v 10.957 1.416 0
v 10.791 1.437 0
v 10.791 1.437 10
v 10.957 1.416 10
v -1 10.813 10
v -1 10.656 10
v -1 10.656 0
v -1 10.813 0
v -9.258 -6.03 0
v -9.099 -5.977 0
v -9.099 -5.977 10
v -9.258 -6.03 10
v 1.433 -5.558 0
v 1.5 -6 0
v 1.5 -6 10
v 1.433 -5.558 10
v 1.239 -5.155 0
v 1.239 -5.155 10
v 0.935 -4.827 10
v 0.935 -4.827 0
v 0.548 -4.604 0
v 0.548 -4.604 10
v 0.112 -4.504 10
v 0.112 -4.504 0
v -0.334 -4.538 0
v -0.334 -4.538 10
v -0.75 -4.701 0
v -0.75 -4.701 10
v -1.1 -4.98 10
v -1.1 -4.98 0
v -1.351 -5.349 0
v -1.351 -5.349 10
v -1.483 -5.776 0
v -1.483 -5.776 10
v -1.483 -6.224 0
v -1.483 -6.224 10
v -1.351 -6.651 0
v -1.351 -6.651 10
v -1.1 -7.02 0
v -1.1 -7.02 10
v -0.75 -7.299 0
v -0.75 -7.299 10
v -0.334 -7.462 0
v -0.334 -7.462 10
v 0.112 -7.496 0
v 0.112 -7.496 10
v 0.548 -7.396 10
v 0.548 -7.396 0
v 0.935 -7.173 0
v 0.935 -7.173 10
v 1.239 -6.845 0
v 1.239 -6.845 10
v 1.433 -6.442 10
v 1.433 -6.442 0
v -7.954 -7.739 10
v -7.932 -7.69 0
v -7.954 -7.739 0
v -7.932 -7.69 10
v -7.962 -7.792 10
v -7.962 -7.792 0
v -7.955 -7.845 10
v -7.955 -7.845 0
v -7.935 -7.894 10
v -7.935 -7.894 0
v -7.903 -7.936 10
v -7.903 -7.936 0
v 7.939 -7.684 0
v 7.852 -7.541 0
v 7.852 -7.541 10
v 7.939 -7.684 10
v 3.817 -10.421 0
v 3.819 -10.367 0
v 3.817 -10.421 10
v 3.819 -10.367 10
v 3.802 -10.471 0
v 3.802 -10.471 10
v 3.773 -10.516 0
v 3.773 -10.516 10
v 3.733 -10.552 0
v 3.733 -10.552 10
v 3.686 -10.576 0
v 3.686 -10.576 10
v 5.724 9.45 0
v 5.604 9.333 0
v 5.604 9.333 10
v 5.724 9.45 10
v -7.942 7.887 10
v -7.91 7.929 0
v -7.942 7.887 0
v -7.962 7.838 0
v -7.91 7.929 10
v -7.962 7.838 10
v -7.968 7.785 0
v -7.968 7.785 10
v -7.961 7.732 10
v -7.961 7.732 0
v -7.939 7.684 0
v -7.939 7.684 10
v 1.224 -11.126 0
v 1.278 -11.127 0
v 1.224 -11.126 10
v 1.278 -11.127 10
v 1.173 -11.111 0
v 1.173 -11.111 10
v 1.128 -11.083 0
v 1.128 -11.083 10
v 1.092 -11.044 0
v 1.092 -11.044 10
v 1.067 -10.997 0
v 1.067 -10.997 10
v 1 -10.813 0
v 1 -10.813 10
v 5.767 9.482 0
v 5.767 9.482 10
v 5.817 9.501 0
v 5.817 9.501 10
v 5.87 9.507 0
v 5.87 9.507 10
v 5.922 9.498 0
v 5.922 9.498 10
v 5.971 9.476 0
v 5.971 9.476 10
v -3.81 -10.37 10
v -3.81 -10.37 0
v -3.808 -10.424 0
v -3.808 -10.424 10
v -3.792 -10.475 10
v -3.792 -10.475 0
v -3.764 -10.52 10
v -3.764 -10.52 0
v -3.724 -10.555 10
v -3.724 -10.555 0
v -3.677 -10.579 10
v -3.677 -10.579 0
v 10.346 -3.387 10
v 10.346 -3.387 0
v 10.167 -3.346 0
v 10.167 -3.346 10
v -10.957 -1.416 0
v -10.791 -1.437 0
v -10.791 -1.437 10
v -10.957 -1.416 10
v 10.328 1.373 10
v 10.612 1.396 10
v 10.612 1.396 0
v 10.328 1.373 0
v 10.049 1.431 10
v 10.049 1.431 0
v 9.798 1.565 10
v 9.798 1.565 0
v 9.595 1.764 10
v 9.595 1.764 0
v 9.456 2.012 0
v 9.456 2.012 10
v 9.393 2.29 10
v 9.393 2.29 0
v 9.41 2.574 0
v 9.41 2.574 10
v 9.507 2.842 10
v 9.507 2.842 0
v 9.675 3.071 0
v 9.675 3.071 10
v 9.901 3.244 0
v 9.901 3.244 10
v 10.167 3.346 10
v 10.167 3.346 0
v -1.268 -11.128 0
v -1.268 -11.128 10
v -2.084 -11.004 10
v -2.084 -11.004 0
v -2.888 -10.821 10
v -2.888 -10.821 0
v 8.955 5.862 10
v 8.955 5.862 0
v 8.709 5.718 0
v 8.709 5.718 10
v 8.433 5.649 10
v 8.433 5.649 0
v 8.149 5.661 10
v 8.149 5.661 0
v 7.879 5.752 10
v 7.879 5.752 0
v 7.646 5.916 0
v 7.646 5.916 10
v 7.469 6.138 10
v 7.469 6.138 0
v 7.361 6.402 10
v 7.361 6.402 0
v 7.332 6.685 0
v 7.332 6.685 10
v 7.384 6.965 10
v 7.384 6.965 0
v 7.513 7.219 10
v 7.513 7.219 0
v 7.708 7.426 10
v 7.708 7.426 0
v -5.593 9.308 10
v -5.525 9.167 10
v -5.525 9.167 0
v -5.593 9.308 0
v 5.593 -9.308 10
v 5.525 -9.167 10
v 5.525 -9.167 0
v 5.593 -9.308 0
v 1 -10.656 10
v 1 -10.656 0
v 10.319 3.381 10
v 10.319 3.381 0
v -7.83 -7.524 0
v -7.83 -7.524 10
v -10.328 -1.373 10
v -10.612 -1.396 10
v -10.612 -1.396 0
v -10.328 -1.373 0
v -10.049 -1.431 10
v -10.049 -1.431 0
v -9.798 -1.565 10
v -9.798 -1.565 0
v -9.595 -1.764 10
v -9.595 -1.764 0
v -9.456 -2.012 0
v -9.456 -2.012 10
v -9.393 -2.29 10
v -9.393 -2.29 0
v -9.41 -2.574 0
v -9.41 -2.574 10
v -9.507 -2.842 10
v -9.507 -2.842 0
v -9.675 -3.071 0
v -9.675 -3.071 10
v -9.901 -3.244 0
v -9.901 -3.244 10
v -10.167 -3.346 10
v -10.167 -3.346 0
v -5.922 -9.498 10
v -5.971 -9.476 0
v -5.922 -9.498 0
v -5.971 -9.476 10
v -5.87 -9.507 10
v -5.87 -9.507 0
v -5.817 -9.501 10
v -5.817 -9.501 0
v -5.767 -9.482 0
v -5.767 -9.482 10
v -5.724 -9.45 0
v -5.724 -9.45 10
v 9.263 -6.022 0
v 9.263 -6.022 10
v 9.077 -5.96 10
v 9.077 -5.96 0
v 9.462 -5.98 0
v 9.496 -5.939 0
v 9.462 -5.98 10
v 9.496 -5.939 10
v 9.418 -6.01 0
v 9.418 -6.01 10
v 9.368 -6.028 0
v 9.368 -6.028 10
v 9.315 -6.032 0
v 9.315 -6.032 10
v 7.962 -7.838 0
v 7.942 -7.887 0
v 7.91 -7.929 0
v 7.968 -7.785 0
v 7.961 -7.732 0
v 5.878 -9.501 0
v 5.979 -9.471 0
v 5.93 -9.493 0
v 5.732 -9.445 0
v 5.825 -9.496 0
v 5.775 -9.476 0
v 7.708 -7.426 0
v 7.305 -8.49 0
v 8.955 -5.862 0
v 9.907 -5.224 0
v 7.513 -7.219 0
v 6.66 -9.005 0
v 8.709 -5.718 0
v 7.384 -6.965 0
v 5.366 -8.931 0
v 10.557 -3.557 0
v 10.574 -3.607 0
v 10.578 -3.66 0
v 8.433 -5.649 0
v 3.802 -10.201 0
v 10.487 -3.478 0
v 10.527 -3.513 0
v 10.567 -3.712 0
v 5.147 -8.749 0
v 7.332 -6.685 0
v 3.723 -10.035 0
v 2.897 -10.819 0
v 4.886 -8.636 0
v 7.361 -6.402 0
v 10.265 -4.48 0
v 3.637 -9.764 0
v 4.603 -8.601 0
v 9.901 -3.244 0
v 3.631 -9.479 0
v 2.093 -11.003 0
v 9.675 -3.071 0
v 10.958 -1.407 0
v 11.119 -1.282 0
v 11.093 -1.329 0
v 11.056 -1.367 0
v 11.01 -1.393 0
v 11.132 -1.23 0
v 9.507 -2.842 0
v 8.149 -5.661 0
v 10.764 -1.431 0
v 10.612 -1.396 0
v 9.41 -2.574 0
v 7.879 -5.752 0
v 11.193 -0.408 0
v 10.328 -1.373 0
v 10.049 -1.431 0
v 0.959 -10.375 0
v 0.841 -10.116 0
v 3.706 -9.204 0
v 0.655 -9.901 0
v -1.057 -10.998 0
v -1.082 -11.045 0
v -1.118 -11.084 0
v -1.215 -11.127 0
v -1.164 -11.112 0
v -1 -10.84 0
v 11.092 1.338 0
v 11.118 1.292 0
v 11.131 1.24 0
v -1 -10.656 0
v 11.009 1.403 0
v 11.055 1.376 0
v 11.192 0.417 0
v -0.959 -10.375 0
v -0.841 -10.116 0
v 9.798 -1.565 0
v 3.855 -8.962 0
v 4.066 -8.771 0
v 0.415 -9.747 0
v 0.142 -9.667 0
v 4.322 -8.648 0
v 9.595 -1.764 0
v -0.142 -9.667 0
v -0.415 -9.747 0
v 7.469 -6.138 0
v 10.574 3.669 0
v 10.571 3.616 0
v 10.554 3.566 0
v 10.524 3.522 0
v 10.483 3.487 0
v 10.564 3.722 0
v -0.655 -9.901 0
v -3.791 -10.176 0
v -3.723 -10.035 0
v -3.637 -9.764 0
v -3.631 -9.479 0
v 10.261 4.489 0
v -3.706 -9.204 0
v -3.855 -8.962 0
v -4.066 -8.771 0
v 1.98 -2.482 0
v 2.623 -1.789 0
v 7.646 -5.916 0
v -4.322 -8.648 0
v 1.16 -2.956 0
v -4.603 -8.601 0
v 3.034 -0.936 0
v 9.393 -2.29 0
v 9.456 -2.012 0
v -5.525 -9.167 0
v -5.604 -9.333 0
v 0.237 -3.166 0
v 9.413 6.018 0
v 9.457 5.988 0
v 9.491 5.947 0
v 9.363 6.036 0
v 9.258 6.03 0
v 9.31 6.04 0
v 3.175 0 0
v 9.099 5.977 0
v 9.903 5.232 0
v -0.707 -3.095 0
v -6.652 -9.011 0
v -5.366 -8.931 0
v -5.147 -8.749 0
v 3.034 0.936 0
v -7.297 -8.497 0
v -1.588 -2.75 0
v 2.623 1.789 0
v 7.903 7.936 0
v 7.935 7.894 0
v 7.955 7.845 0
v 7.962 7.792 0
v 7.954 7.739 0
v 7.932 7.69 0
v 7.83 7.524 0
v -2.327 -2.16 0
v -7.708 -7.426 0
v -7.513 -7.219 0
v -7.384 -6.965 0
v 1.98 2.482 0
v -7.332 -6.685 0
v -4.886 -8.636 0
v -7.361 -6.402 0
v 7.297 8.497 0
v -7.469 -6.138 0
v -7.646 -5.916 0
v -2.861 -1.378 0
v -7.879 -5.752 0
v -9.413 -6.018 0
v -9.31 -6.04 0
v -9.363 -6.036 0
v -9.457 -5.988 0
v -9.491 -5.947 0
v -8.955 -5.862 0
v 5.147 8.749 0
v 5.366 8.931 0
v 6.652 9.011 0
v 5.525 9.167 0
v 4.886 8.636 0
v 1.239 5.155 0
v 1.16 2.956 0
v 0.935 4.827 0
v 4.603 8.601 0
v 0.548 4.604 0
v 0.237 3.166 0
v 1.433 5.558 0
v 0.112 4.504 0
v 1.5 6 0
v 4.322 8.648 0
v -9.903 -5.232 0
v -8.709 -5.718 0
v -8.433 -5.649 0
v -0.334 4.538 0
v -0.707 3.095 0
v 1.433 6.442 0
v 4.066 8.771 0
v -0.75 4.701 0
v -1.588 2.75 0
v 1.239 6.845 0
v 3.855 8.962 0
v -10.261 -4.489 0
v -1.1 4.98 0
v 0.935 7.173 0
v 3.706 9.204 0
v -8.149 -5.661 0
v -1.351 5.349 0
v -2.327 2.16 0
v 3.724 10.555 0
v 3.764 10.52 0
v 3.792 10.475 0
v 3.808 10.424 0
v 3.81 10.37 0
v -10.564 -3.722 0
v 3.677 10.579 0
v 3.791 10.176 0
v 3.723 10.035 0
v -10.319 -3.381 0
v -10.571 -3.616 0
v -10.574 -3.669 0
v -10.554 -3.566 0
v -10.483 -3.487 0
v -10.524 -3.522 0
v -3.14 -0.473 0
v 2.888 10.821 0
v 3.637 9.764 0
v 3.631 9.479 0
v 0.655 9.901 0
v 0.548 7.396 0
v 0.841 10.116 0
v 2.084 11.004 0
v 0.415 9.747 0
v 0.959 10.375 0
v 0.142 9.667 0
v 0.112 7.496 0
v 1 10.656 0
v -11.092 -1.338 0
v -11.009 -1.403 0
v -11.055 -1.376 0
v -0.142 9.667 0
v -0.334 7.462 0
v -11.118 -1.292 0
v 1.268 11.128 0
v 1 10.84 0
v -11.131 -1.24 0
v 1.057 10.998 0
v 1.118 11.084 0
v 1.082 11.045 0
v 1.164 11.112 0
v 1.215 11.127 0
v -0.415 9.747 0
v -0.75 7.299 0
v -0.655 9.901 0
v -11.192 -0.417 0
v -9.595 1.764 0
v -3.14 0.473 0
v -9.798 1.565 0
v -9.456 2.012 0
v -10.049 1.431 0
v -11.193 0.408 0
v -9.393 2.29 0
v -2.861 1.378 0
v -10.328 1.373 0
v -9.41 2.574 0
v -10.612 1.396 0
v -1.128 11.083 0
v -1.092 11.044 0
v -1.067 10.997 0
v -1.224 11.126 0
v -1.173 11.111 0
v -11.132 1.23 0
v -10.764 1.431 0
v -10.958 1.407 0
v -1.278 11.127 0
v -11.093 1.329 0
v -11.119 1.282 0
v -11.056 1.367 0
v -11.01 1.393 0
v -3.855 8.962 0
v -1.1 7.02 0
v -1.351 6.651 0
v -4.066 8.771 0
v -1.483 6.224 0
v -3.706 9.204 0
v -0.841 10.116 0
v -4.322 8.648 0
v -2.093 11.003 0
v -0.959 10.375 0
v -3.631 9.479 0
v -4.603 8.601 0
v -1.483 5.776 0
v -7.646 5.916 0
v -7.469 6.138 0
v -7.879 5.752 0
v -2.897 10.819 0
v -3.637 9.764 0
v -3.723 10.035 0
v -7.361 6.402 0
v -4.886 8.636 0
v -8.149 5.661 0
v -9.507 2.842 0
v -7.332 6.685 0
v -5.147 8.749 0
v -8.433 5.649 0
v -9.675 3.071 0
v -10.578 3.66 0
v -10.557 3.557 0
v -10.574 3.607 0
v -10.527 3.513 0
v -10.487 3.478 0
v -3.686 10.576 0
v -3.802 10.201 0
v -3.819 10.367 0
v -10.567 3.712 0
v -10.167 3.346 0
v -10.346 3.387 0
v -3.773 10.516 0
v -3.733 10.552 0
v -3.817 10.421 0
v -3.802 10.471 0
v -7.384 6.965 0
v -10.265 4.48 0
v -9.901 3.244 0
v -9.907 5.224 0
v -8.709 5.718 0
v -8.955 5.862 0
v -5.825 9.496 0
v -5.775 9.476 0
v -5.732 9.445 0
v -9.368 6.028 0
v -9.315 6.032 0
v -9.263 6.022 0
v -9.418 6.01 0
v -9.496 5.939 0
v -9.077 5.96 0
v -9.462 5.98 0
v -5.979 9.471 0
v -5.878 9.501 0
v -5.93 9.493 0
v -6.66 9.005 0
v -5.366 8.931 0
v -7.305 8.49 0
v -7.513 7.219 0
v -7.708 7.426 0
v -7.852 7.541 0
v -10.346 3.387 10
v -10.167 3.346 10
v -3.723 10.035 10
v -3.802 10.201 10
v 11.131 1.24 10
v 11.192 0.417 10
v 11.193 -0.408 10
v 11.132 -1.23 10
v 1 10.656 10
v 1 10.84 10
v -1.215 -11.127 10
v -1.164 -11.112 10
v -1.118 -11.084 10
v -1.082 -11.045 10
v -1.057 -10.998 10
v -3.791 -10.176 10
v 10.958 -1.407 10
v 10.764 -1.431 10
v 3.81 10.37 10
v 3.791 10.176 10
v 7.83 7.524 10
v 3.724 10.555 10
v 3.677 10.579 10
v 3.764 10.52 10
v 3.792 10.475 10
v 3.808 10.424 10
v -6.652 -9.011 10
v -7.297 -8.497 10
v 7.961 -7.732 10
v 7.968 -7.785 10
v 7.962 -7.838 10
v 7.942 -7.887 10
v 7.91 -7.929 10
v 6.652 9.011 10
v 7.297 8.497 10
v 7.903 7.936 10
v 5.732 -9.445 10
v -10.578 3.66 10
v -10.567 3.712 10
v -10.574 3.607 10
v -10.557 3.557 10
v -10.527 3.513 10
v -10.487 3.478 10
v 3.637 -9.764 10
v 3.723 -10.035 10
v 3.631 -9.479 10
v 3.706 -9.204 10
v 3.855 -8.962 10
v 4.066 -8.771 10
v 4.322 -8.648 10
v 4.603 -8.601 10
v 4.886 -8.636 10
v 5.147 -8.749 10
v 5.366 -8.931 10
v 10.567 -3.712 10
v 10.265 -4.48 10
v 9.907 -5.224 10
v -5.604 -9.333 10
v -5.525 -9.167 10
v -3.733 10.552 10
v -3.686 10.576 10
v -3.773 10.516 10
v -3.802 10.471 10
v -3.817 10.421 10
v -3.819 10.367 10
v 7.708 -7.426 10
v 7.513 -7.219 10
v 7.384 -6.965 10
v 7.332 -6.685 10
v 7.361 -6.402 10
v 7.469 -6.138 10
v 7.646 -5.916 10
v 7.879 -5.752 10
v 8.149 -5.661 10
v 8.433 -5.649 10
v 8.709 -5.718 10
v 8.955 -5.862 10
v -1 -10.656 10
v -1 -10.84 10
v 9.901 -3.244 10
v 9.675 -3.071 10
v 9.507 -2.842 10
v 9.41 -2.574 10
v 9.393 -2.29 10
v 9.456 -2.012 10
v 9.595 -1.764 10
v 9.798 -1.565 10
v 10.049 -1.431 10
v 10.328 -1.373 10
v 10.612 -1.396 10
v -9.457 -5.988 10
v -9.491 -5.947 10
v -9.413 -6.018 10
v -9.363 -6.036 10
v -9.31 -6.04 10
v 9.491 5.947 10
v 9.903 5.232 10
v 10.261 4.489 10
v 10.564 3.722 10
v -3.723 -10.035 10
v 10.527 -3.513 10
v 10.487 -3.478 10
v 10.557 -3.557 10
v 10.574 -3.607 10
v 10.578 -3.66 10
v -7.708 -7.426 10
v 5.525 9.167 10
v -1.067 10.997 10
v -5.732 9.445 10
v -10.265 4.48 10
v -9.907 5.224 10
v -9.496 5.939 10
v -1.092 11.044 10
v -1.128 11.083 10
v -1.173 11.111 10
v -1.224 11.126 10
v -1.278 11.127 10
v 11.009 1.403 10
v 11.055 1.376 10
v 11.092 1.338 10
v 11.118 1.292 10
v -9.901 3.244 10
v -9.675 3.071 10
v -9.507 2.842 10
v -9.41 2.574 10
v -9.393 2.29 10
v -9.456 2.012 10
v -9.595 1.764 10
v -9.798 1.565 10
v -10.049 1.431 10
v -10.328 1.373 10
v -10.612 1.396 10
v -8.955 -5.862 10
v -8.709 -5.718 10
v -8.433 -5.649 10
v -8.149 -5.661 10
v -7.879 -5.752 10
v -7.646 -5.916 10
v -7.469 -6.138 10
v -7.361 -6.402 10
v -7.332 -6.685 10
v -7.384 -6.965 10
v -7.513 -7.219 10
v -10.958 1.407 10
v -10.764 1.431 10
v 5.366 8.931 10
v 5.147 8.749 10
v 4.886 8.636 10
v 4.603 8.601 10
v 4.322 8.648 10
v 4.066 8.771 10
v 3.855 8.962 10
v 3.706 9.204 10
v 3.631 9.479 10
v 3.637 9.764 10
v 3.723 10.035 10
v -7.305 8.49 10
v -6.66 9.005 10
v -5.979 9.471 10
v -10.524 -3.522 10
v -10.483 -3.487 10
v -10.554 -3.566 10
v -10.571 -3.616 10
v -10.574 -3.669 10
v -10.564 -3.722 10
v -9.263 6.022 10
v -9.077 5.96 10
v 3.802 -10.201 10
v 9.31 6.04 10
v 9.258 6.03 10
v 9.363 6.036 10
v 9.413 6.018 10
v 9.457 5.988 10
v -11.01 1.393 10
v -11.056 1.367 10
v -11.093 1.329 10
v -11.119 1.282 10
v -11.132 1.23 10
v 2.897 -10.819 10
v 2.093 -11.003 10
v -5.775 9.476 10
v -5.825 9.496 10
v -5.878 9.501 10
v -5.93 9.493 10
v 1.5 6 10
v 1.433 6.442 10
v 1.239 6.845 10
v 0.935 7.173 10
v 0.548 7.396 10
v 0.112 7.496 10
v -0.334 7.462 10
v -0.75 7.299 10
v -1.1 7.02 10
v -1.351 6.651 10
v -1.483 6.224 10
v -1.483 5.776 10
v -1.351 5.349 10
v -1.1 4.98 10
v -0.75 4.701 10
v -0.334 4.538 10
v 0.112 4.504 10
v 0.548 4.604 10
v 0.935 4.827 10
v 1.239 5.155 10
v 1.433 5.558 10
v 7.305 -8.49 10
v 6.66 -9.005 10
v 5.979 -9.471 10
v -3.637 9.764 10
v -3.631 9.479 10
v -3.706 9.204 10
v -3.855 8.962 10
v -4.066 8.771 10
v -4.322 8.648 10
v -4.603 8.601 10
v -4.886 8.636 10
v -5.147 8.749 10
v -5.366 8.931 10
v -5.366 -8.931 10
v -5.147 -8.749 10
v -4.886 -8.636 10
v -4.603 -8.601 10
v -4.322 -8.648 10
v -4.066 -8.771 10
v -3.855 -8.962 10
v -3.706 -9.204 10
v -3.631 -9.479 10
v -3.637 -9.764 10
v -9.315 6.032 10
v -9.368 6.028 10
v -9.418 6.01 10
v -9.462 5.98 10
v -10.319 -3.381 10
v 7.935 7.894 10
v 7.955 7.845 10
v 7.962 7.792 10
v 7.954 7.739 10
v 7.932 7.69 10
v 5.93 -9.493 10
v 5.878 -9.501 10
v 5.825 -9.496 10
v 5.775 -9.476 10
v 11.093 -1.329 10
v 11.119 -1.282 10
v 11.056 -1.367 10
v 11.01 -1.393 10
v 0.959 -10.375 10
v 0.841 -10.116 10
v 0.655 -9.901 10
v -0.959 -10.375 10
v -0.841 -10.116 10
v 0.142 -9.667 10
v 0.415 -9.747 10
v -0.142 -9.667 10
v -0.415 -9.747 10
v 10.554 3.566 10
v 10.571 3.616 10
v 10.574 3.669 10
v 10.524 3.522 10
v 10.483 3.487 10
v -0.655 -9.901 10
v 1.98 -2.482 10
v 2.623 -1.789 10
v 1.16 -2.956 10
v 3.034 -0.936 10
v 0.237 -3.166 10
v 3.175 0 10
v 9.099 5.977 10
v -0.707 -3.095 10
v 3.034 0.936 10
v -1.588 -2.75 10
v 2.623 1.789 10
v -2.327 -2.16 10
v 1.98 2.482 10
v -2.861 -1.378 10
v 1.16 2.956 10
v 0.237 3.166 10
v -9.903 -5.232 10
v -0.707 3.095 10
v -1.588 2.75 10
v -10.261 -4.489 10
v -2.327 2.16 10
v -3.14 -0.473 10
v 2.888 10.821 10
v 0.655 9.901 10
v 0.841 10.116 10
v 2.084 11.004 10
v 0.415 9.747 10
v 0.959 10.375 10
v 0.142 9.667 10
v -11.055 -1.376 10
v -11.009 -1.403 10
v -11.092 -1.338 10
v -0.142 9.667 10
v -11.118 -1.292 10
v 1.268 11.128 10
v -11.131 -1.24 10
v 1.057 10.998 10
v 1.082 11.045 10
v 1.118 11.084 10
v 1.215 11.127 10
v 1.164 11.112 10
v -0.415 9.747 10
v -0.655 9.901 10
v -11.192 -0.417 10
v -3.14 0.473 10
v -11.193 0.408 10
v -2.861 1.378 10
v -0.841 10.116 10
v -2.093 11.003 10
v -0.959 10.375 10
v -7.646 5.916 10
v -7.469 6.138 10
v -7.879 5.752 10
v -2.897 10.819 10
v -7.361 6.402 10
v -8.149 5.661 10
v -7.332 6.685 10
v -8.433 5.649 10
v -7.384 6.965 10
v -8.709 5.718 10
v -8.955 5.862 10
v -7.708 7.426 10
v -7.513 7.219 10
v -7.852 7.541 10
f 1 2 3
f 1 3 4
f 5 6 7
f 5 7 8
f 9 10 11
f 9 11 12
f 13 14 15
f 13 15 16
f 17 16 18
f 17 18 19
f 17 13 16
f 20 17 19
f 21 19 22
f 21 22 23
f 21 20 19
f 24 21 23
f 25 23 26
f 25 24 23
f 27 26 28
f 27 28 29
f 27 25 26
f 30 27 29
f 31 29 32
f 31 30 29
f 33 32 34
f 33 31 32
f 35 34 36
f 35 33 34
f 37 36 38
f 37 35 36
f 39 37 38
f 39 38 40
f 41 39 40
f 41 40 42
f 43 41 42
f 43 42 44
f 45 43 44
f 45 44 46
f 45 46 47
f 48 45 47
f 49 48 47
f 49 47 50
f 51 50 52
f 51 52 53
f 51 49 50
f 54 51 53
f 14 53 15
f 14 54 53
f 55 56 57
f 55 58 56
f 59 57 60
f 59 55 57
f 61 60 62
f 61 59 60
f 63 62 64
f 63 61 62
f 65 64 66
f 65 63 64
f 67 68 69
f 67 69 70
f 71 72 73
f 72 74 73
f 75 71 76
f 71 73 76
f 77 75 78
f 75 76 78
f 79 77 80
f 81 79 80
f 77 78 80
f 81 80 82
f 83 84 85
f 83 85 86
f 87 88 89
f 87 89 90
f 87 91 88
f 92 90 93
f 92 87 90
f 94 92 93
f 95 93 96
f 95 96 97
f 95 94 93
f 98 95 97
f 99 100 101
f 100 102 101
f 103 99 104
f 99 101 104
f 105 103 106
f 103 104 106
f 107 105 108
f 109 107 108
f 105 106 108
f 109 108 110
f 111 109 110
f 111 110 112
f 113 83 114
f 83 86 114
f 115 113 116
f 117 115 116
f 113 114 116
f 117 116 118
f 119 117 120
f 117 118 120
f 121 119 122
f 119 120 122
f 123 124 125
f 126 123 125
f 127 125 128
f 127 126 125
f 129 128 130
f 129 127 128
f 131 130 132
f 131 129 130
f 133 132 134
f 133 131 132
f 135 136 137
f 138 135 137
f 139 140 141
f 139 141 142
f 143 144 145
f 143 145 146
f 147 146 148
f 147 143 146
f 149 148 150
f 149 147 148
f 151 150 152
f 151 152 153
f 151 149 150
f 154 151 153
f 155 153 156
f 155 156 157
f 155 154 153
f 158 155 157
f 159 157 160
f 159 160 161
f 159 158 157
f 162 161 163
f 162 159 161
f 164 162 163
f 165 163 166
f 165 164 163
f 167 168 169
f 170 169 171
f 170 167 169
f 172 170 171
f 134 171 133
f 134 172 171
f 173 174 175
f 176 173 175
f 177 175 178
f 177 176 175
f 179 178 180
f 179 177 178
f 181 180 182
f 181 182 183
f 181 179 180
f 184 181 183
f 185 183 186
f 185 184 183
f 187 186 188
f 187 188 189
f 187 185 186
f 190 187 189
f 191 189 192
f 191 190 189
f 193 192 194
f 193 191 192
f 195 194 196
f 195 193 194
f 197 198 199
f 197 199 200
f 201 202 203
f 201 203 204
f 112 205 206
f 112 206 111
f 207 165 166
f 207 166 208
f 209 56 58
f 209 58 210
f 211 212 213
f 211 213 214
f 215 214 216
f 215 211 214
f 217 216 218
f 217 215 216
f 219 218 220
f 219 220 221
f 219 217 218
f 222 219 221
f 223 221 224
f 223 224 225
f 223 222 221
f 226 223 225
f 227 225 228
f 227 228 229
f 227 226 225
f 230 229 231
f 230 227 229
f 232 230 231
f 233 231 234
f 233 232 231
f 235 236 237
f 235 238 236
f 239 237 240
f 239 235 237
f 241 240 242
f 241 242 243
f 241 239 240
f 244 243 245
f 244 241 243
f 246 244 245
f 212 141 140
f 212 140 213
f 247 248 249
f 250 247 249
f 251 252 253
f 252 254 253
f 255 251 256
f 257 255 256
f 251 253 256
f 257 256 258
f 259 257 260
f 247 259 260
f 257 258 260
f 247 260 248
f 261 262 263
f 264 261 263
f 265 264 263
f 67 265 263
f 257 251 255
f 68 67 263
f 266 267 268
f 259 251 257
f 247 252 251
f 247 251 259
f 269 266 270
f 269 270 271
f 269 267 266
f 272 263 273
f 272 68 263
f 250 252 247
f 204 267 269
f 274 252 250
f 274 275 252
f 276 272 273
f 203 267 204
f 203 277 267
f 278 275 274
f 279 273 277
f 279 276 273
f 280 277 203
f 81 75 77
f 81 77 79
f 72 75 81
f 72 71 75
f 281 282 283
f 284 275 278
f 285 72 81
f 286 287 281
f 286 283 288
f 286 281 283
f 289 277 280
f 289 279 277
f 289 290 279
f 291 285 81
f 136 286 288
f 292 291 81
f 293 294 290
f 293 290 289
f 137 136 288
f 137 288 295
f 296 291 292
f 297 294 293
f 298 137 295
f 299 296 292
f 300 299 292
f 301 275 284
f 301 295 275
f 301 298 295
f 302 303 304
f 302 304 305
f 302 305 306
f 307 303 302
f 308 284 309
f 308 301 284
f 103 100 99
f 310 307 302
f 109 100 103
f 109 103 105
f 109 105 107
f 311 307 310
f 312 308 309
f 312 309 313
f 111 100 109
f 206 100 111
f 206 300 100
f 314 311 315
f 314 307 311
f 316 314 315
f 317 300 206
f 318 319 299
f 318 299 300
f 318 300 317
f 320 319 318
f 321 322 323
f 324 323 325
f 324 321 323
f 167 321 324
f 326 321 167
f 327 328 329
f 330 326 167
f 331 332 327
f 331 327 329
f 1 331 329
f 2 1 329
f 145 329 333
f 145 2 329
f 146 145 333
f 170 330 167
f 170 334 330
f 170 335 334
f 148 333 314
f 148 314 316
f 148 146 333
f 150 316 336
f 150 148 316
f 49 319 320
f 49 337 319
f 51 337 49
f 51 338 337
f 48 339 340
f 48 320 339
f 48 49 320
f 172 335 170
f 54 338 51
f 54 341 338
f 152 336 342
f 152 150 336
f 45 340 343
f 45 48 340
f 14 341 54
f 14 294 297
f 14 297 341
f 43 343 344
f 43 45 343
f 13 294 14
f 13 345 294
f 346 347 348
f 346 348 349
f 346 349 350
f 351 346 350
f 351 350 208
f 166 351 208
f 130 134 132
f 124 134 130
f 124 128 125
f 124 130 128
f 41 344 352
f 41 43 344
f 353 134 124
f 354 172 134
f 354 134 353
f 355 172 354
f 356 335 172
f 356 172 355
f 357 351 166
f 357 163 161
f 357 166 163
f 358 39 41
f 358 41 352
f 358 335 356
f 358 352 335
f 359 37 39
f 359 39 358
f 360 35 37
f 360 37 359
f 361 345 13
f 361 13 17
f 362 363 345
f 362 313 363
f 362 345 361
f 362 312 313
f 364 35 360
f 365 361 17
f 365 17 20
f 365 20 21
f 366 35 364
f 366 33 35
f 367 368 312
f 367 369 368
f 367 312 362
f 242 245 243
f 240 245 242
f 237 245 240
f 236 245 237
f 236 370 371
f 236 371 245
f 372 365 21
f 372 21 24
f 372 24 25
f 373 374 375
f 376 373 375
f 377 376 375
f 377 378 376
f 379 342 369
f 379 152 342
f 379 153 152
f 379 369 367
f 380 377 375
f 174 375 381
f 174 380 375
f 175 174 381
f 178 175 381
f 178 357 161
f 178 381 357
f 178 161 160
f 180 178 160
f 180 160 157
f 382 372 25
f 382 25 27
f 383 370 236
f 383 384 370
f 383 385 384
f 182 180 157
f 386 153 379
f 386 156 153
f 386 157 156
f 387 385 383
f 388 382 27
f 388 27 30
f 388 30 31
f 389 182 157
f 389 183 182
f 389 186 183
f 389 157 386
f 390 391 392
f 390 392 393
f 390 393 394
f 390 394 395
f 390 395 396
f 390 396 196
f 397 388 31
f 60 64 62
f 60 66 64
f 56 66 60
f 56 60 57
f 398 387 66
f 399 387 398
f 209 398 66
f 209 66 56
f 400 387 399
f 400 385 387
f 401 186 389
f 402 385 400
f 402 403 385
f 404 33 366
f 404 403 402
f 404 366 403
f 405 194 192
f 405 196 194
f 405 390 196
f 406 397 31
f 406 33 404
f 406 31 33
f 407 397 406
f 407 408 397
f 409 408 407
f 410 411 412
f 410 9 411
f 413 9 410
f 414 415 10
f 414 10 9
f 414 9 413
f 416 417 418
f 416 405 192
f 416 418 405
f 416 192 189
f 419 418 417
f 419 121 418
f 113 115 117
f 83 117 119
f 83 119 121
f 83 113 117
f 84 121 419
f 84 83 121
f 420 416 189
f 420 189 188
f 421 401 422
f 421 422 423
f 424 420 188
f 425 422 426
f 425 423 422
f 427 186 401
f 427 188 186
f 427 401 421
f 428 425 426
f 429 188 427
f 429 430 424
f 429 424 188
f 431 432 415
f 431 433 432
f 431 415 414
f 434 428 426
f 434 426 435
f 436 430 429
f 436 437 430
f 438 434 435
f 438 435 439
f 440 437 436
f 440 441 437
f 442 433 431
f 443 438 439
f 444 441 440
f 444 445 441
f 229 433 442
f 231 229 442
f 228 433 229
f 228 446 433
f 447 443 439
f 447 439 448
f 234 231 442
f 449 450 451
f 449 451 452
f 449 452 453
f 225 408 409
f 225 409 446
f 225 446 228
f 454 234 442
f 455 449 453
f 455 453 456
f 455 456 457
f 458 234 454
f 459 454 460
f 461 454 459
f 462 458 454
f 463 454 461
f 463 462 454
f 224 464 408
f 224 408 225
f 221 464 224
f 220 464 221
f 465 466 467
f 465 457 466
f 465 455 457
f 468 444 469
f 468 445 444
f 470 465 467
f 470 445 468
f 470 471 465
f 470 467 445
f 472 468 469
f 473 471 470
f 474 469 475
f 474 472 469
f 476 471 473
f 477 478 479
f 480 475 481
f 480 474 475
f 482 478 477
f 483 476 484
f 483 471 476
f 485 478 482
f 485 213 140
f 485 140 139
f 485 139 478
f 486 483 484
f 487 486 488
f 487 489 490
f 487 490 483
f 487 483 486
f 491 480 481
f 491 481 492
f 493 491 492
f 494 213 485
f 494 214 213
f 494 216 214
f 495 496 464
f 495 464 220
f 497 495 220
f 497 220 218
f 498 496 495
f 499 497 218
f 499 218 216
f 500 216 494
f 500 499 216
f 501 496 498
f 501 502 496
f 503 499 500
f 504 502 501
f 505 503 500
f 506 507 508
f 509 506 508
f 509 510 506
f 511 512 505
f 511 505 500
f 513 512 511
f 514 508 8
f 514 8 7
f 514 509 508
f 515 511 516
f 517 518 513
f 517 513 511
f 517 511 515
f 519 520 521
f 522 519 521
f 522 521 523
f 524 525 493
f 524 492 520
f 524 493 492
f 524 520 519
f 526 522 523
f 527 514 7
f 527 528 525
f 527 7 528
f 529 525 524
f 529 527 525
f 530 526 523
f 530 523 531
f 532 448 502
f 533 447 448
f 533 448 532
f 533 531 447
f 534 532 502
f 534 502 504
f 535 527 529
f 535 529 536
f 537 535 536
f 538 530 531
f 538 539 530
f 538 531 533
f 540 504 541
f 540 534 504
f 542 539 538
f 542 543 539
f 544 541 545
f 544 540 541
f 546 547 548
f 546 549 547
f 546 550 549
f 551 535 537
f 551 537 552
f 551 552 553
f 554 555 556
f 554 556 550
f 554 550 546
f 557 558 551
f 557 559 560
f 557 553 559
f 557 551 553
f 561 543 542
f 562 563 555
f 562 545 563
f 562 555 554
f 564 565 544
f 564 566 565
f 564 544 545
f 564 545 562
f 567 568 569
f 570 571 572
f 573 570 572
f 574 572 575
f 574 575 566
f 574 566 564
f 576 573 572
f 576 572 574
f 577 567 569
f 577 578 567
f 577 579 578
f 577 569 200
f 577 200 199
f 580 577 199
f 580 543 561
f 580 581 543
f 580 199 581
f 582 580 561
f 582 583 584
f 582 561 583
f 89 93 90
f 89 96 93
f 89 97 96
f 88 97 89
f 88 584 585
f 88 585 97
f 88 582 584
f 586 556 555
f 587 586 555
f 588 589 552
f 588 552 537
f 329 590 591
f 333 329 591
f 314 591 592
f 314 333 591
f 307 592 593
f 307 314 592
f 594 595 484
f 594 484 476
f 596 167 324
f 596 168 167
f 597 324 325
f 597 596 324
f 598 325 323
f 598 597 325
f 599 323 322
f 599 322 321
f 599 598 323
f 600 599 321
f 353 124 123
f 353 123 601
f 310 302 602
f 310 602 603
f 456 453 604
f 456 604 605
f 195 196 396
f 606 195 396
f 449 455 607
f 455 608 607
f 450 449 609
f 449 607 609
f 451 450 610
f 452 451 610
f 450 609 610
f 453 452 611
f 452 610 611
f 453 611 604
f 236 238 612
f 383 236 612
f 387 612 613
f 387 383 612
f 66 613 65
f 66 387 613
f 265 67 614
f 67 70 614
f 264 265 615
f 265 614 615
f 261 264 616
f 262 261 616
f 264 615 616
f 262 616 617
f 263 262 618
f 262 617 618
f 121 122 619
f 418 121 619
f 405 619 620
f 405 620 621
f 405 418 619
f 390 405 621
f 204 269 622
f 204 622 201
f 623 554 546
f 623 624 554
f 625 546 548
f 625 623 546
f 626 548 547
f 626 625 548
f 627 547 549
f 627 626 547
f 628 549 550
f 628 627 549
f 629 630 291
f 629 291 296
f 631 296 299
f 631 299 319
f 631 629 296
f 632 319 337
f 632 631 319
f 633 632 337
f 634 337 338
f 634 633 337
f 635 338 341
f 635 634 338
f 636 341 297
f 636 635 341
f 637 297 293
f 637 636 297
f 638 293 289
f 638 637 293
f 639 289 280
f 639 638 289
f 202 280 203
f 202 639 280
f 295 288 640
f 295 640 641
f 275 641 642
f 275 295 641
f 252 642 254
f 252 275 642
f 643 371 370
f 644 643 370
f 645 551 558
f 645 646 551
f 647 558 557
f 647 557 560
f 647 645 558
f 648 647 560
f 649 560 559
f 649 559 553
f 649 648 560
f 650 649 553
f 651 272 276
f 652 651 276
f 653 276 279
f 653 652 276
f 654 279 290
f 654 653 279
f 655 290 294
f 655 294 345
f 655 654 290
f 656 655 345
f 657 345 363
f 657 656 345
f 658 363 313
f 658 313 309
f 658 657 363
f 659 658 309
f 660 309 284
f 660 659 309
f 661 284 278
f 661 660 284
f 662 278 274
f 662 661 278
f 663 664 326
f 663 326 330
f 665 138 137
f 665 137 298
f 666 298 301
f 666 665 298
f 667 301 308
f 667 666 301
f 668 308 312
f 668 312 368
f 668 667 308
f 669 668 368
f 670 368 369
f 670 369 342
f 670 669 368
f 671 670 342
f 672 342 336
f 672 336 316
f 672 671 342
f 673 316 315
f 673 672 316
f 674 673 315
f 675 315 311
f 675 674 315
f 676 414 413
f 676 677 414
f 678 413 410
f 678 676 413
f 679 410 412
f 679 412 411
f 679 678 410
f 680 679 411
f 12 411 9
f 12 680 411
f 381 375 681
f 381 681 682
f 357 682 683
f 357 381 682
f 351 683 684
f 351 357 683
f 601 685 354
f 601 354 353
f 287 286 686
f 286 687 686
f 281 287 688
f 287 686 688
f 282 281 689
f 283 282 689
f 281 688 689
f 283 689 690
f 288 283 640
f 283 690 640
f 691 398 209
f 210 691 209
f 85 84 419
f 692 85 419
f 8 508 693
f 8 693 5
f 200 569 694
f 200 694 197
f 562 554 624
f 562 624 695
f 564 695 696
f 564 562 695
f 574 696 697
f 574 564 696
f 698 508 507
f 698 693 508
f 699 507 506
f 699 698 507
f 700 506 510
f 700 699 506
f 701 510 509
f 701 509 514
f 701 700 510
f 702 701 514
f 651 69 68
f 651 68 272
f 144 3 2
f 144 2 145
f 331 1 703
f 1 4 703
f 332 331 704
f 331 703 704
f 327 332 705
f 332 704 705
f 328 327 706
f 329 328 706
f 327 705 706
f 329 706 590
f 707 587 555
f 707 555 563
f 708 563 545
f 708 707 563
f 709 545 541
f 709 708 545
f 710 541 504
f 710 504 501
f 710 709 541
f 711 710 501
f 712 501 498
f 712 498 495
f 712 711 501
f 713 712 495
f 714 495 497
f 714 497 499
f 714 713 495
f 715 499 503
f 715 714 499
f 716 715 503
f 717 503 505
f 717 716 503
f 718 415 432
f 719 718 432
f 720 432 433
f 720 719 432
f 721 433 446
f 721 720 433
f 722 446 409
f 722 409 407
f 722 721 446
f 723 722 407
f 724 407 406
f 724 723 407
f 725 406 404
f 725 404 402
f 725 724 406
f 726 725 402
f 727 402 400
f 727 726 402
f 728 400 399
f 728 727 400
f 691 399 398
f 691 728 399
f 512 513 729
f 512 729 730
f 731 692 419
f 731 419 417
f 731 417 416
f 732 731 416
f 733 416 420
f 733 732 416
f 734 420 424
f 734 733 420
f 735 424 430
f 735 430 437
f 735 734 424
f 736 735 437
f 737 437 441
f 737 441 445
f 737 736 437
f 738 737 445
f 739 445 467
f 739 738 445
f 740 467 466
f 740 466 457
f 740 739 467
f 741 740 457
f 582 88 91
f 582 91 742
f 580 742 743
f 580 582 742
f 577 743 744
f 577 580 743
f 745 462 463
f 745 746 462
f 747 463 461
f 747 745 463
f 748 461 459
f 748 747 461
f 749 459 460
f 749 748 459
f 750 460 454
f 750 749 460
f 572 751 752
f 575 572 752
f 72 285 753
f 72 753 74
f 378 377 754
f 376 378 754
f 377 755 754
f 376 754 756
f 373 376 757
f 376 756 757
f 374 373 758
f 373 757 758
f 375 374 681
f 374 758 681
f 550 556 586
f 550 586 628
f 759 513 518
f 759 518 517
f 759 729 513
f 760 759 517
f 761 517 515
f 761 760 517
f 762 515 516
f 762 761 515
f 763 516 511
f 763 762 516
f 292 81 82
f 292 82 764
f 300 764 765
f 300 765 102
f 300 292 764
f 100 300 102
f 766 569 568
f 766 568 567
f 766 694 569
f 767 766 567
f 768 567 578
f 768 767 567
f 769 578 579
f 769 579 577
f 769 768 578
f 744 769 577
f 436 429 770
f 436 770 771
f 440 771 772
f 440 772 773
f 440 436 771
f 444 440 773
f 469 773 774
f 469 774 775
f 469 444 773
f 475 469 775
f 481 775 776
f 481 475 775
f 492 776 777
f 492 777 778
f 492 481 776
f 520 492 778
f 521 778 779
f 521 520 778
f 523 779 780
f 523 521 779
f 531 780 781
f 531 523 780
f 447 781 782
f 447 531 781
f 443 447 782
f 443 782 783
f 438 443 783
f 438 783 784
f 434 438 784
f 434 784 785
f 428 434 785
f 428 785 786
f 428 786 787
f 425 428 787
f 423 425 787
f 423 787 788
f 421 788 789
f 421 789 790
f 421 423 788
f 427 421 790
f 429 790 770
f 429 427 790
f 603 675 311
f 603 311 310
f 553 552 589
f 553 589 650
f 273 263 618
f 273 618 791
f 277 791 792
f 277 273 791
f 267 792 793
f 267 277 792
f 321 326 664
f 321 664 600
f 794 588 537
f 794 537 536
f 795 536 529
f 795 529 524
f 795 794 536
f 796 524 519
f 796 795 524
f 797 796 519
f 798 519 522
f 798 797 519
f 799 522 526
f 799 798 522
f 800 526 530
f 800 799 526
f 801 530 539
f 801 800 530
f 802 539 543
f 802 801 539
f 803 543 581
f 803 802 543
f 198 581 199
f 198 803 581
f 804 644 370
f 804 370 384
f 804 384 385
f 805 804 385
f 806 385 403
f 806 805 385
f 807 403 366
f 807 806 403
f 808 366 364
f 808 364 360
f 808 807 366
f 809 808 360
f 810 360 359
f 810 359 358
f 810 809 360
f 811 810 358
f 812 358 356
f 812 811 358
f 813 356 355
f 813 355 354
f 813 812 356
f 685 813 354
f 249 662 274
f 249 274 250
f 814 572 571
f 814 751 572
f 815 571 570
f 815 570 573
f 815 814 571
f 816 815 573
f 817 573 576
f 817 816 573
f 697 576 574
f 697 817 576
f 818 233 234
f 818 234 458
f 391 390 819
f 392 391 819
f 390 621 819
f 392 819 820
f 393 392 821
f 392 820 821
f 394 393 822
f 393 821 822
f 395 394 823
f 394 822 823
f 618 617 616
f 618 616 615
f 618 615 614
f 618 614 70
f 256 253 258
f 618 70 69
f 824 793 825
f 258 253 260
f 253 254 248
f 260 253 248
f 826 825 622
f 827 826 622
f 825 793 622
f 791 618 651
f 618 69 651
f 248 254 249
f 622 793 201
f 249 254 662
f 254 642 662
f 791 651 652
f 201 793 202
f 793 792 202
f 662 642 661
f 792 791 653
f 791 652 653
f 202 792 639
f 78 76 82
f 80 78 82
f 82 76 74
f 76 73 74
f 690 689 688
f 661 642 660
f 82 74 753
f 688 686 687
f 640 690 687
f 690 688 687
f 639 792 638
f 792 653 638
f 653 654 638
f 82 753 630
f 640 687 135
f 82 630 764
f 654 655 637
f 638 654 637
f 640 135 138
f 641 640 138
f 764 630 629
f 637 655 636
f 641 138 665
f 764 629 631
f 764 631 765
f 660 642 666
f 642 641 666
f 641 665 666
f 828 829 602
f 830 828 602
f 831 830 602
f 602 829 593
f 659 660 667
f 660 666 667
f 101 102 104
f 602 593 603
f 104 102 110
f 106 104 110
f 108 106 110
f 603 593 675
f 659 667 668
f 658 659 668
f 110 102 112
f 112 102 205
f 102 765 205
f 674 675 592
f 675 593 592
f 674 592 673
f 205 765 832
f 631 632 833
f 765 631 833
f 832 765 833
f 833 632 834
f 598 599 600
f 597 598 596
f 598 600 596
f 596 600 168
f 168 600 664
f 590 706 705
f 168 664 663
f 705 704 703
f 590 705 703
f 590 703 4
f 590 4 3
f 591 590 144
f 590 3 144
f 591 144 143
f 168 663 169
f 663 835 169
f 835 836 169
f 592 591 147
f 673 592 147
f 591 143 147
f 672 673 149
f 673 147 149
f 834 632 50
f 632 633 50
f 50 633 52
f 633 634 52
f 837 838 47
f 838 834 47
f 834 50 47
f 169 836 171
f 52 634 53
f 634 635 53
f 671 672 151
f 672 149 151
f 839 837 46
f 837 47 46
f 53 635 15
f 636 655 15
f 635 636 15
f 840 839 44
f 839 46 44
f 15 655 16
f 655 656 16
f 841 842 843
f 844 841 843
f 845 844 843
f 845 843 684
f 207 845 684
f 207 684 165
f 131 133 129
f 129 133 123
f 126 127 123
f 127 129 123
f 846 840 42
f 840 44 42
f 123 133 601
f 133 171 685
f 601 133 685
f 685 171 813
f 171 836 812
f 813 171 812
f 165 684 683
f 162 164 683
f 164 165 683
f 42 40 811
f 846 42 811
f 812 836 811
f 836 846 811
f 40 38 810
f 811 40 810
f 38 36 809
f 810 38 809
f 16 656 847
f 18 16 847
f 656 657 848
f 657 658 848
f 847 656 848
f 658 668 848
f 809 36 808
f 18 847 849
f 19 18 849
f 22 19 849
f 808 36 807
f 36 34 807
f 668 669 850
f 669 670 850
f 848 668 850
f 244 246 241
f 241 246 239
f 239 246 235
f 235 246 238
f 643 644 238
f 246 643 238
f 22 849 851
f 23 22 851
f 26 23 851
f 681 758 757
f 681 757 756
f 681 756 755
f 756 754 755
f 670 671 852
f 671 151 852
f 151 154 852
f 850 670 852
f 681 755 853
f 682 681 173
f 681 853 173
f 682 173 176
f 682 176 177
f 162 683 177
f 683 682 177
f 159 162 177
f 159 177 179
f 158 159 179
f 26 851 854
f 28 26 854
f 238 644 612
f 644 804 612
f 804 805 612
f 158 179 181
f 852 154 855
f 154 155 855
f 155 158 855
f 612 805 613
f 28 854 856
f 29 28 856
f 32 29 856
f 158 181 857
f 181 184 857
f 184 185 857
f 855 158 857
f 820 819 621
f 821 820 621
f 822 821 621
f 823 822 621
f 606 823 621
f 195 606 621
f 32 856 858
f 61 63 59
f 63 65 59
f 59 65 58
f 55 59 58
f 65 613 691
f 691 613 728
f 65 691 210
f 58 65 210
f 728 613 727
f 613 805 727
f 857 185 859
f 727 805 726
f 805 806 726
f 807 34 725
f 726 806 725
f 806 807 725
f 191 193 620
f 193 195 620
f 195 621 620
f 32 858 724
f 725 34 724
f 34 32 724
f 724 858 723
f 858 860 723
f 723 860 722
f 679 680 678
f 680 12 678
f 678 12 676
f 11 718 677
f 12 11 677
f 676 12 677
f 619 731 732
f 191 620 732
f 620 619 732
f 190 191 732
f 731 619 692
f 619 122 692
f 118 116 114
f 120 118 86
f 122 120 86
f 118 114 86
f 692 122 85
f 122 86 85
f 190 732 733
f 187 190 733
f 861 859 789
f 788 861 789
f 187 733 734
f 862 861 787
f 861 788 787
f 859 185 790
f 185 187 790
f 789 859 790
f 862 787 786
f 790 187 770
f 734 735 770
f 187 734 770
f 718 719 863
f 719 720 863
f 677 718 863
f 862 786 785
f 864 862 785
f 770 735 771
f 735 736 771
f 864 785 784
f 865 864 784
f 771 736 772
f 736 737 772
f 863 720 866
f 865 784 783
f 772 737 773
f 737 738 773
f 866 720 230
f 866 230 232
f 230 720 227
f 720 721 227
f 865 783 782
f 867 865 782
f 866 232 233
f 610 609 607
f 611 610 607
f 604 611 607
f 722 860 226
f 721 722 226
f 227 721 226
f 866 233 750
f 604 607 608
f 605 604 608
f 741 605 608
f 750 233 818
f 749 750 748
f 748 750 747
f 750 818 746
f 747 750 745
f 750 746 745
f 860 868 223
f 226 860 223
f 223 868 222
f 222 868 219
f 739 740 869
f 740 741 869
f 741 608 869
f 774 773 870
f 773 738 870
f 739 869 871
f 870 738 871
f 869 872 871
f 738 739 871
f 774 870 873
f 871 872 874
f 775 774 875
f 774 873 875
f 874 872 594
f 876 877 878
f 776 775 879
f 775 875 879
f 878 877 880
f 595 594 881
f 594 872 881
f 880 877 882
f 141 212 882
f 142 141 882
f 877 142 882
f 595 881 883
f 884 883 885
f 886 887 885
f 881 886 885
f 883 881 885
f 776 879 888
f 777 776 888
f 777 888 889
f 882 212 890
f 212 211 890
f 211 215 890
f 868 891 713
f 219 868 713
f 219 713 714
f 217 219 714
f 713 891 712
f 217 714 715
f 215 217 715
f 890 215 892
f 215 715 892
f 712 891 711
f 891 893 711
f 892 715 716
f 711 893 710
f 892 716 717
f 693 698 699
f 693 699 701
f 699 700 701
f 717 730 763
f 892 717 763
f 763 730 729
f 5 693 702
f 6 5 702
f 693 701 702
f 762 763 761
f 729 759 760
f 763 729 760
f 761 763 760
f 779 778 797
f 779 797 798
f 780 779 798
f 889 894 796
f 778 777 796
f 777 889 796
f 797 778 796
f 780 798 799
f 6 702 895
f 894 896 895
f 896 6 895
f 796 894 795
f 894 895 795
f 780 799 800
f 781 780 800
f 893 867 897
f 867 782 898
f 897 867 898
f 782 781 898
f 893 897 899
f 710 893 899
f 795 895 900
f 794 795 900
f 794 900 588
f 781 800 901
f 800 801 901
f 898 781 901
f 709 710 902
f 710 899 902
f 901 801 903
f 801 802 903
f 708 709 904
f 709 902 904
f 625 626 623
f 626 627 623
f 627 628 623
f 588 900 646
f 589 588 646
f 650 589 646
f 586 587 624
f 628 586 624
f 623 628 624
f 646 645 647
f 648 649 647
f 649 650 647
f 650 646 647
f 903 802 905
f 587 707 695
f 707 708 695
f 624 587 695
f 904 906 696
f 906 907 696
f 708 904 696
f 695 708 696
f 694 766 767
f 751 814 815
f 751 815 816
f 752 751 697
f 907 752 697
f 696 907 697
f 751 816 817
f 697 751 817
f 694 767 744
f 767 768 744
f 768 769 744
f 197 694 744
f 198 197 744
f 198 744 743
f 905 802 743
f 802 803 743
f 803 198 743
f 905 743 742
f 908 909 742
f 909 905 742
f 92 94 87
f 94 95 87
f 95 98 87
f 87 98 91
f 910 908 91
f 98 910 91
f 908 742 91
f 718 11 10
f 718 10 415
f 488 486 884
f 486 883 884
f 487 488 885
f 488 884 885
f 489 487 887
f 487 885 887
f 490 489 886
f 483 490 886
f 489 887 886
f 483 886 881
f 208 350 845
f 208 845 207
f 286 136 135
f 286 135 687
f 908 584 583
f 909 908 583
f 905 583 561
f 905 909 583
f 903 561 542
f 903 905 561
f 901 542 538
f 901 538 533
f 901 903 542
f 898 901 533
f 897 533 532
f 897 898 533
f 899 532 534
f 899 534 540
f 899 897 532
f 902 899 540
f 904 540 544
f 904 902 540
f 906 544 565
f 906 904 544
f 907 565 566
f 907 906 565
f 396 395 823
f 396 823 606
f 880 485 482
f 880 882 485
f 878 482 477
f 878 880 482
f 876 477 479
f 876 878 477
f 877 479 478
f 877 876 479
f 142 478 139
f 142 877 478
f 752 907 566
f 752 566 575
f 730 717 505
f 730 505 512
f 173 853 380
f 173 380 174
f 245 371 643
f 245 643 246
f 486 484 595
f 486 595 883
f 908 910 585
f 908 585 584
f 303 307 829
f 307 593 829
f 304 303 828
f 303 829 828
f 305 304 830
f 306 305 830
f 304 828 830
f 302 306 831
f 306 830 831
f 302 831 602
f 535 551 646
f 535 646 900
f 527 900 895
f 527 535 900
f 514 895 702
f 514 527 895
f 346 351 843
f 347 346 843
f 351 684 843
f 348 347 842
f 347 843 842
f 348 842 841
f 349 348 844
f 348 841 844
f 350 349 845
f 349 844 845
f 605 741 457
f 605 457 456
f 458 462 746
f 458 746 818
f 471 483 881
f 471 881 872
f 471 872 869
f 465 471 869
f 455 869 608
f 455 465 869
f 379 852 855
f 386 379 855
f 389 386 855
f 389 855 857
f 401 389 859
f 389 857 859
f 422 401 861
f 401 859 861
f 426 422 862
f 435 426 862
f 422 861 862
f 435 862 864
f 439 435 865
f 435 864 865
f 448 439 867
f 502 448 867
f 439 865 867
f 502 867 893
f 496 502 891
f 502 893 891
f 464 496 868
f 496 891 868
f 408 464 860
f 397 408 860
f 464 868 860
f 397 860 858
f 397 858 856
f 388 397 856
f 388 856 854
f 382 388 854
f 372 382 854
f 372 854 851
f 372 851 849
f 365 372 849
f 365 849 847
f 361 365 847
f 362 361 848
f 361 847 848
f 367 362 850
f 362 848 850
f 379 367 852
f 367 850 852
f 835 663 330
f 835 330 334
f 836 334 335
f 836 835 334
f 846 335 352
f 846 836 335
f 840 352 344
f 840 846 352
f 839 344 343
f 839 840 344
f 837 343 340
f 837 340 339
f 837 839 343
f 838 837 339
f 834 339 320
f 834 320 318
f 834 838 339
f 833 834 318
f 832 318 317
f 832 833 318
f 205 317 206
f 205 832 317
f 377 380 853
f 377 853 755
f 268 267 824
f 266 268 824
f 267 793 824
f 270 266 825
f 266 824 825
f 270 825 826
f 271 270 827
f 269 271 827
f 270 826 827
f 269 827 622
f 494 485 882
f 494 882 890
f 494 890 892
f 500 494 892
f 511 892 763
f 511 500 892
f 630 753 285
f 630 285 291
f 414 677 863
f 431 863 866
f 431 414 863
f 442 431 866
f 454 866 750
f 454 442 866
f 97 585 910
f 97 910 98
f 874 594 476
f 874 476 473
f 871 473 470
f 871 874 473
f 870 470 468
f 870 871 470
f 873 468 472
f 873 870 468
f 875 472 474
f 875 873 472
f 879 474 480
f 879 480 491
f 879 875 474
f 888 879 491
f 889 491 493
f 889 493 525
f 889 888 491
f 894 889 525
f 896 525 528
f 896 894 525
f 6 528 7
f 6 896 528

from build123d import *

# Parameters (mm, degrees)
SKETCH_1_R          = 2.5
SKETCH_1_R_2        = 1.5
EXTRUDE_1_DEPTH     = 10
FILLET_1_R          = 0.2
CUT_EXTRUDE_1_DEPTH = 10
SKETCH_3_R          = 3.175
CUT_EXTRUDE_2_DEPTH = 10


with BuildPart() as part:
    # Эскиз1 → Вытянуть1 (new body)
    with BuildSketch(Plane.XY):
        with BuildLine():
            Line((-0.685932761, 9.95), (0, 9.95))
            Line((0, 9.95), (0.676, 9.95))
            Line((0.676, 9.95), (1.110862137, 11.144773901))
            ThreePointArc((1.110862137, 11.144773901), (2.487539236, 10.920263209), (3.825633205, 10.526373097))
            Line((3.825633205, 10.526373097), (3.699139141, 9.262255307))
            Line((3.699139141, 9.262255307), (4.317143204, 8.964640236))
            Line((4.317143204, 8.964640236), (4.926198159, 8.671334828))
            Line((4.926198159, 8.671334828), (5.836388374, 9.559109307))
            ThreePointArc((5.836388374, 9.559109307), (6.979320043, 8.759514355), (8.013998536, 7.824054413))
            Line((8.013998536, 7.824054413), (7.351551169, 6.740007356))
            Line((7.351551169, 6.740007356), (7.779223251, 6.203723528))
            Line((7.779223251, 6.203723528), (8.200702357, 5.675205446))
            Line((8.200702357, 5.675205446), (9.405946315, 6.08014588))
            ThreePointArc((9.405946315, 6.08014588), (10.088760919, 4.863836255), (10.615093172, 3.572085797))
            Line((10.615093172, 3.572085797), (9.547898328, 2.882818288))
            Line((9.547898328, 2.882818288), (9.700532726, 2.214083293))
            Line((9.700532726, 2.214083293), (9.850956878, 1.555032024))
            Line((9.850956878, 1.555032024), (11.112541232, 1.396934994))
            ThreePointArc((11.112541232, 1.396934994), (11.199998965, 0.004815734), (11.11373842, -1.38737822))
            Line((11.11373842, -1.38737822), (9.853167125, -1.545348298))
            Line((9.853167125, -1.545348298), (9.700532726, -2.214083293))
            Line((9.700532726, -2.214083293), (9.550108575, -2.873134562))
            Line((9.550108575, -2.873134562), (10.618161071, -3.562956001))
            ThreePointArc((10.618161071, -3.562956001), (10.092939856, -4.855158602), (9.411171473, -6.072054966))
            Line((9.411171473, -6.072054966), (8.206895332, -5.667439701))
            Line((8.206895332, -5.667439701), (7.779223251, -6.203723528))
            Line((7.779223251, -6.203723528), (7.357744145, -6.732241611))
            Line((7.357744145, -6.732241611), (8.020723888, -7.817159863))
            ThreePointArc((8.020723888, -7.817159863), (6.986850228, -8.753509233), (5.844606595, -9.554086756))
            Line((5.844606595, -9.554086756), (4.935147268, -8.667025164))
            Line((4.935147268, -8.667025164), (4.317143204, -8.964640236))
            Line((4.317143204, -8.964640236), (3.70808825, -9.257945643))
            Line((3.70808825, -9.257945643), (3.83468397, -10.523079343))
            ThreePointArc((3.83468397, -10.523079343), (2.496929223, -10.918120005), (1.120445701, -11.143814492))
            Line((1.120445701, -11.143814492), (0.685932761, -9.95))
            Line((0.685932761, -9.95), (0, -9.95))
            Line((0, -9.95), (-0.676, -9.95))
            Line((-0.676, -9.95), (-1.110862137, -11.144773901))
            ThreePointArc((-1.110862137, -11.144773901), (-2.487539236, -10.920263209), (-3.825633205, -10.526373097))
            Line((-3.825633205, -10.526373097), (-3.699139141, -9.262255307))
            Line((-3.699139141, -9.262255307), (-4.317143204, -8.964640236))
            Line((-4.317143204, -8.964640236), (-4.926198159, -8.671334828))
            Line((-4.926198159, -8.671334828), (-5.836388374, -9.559109307))
            ThreePointArc((-5.836388374, -9.559109307), (-6.979320043, -8.759514355), (-8.013998536, -7.824054413))
            Line((-8.013998536, -7.824054413), (-7.351551169, -6.740007356))
            Line((-7.351551169, -6.740007356), (-7.779223251, -6.203723528))
            Line((-7.779223251, -6.203723528), (-8.200702357, -5.675205446))
            Line((-8.200702357, -5.675205446), (-9.405946315, -6.08014588))
            ThreePointArc((-9.405946315, -6.08014588), (-10.088760919, -4.863836255), (-10.615093172, -3.572085797))
            Line((-10.615093172, -3.572085797), (-9.547898328, -2.882818288))
            Line((-9.547898328, -2.882818288), (-9.700532726, -2.214083293))
            Line((-9.700532726, -2.214083293), (-9.850956878, -1.555032024))
            Line((-9.850956878, -1.555032024), (-11.112541232, -1.396934994))
            ThreePointArc((-11.112541232, -1.396934994), (-11.199998965, -0.004815734), (-11.11373842, 1.38737822))
            Line((-11.11373842, 1.38737822), (-9.853167125, 1.545348298))
            Line((-9.853167125, 1.545348298), (-9.700532726, 2.214083293))
            Line((-9.700532726, 2.214083293), (-9.550108575, 2.873134562))
            Line((-9.550108575, 2.873134562), (-10.618161071, 3.562956001))
            ThreePointArc((-10.618161071, 3.562956001), (-10.092939856, 4.855158602), (-9.411171473, 6.072054966))
            Line((-9.411171473, 6.072054966), (-8.206895332, 5.667439701))
            Line((-8.206895332, 5.667439701), (-7.779223251, 6.203723528))
            Line((-7.779223251, 6.203723528), (-7.357744145, 6.732241611))
            Line((-7.357744145, 6.732241611), (-8.020723888, 7.817159863))
            ThreePointArc((-8.020723888, 7.817159863), (-6.986850228, 8.753509233), (-5.844606595, 9.554086756))
            Line((-5.844606595, 9.554086756), (-4.935147268, 8.667025164))
            Line((-4.935147268, 8.667025164), (-4.317143204, 8.964640236))
            Line((-4.317143204, 8.964640236), (-3.70808825, 9.257945643))
            Line((-3.70808825, 9.257945643), (-3.83468397, 10.523079343))
            ThreePointArc((-3.83468397, 10.523079343), (-2.496929223, 10.918120005), (-1.120445701, 11.143814492))
            Line((-1.120445701, 11.143814492), (-0.685932761, 9.95))
        make_face()
        Circle(SKETCH_1_R, mode=Mode.SUBTRACT)
        with Locations((0, 6)):
            Circle(SKETCH_1_R_2, mode=Mode.SUBTRACT)
        with Locations((0, -6)):
            Circle(SKETCH_1_R_2, mode=Mode.SUBTRACT)
    extrude(amount=EXTRUDE_1_DEPTH)

    # Скругление1
    fillet_1_edges = [part.edges().sort_by_distance(p)[0] for p in [
        (9.547898328, 2.882818288, 5),
        (9.850956878, 1.555032024, 5),
        (11.112541232, 1.396934994, 5),
        (11.11373842, -1.38737822, 5),
        (9.853167125, -1.545348298, 5),
        (9.550108575, -2.873134562, 5),
        (10.618161071, -3.562956001, 5),
        (9.411171473, -6.072054966, 5),
        (8.206895332, -5.667439701, 5),
        (7.357744145, -6.732241611, 5),
        (8.020723888, -7.817159863, 5),
        (5.844606595, -9.554086756, 5),
        (4.935147268, -8.667025164, 5),
        (3.70808825, -9.257945643, 5),
        (3.83468397, -10.523079343, 5),
        (1.120445701, -11.143814492, 5),
        (0.685932761, -9.95, 5),
        (-0.676, -9.95, 5),
        (-1.110862137, -11.144773901, 5),
        (-3.825633205, -10.526373097, 5),
        (-3.699139141, -9.262255307, 5),
        (-4.926198159, -8.671334828, 5),
        (-5.836388374, -9.559109307, 5),
        (-8.013998536, -7.824054413, 5),
        (-7.351551169, -6.740007356, 5),
        (-8.200702357, -5.675205446, 5),
        (-9.405946315, -6.08014588, 5),
        (-10.615093172, -3.572085797, 5),
        (-9.547898328, -2.882818288, 5),
        (-9.850956878, -1.555032024, 5),
        (-11.112541232, -1.396934994, 5),
        (-11.11373842, 1.38737822, 5),
        (-9.853167125, 1.545348298, 5),
        (-10.618161071, 3.562956001, 5),
        (-9.411171473, 6.072054966, 5),
        (-8.206895332, 5.667439701, 5),
        (-7.357744145, 6.732241611, 5),
        (-8.020723888, 7.817159863, 5),
        (-5.844606595, 9.554086756, 5),
        (-4.935147268, 8.667025164, 5),
        (-3.70808825, 9.257945643, 5),
        (-3.83468397, 10.523079343, 5),
        (-1.120445701, 11.143814492, 5),
        (-0.685932761, 9.95, 5),
        (0.676, 9.95, 5),
        (1.110862137, 11.144773901, 5),
        (3.825633205, 10.526373097, 5),
        (3.699139141, 9.262255307, 5),
        (4.926198159, 8.671334828, 5),
        (5.836388374, 9.559109307, 5),
        (8.013998536, 7.824054413, 5),
        (7.351551169, 6.740007356, 5),
        (8.200702357, 5.675205446, 5),
        (9.405946315, 6.08014588, 5),
        (10.615093172, 3.572085797, 5),
    ]]
    fillet(fillet_1_edges, radius=FILLET_1_R)

    # Эскиз2 → Вырез-Вытянуть1 (cut)
    with BuildSketch(Plane.XY.offset(10)):
        with BuildLine():
            Line((4.740104239, 12.147692744), (6.542041974, 11.279925266))
            Line((6.542041974, 11.279925266), (5.524607217, 9.167200224))
            ThreePointArc((5.524607217, 9.167200224), (4.18975461, 8.700115095), (3.722669482, 10.034967702))
            Line((3.722669482, 10.034967702), (4.740104239, 12.147692744))
        make_face()
        with BuildLine():
            Line((-1, 13.00134713), (1, 13.00134713))
            Line((1, 13.00134713), (1, 10.656399244))
            ThreePointArc((1, 10.656399244), (0, 9.656399244), (-1, 10.656399244))
            Line((-1, 10.656399244), (-1, 13.00134713))
        make_face()
        with BuildLine():
            Line((9.541372699, 8.888038829), (10.788352303, 7.324375864))
            Line((10.788352303, 7.324375864), (8.95499822, 5.862324771))
            ThreePointArc((8.95499822, 5.862324771), (7.549676936, 6.020666451), (7.708018617, 7.425987736))
            Line((7.708018617, 7.425987736), (9.541372699, 8.888038829))
        make_face()
        with BuildLine():
            Line((12.45285528, 3.867999818), (12.897897147, 1.918143994))
            Line((12.897897147, 1.918143994), (10.611742, 1.396344))
            ThreePointArc((10.611742, 1.396344), (9.414293154, 2.148750978), (10.166700132, 3.346199825))
            Line((10.166700132, 3.346199825), (12.45285528, 3.867999818))
        make_face()
        with BuildLine():
            Line((12.897897147, -1.918143994), (12.45285528, -3.867999818))
            Line((12.45285528, -3.867999818), (10.166700132, -3.346199825))
            ThreePointArc((10.166700132, -3.346199825), (9.414293154, -2.148750978), (10.611742, -1.396344))
            Line((10.611742, -1.396344), (12.897897147, -1.918143994))
        make_face()
        with BuildLine():
            Line((10.788352303, -7.324375864), (9.541372699, -8.888038829))
            Line((9.541372699, -8.888038829), (7.708018617, -7.425987736))
            ThreePointArc((7.708018617, -7.425987736), (7.549676936, -6.020666451), (8.95499822, -5.862324771))
            Line((8.95499822, -5.862324771), (10.788352303, -7.324375864))
        make_face()
        with BuildLine():
            Line((6.542041974, -11.279925266), (4.740104239, -12.147692744))
            Line((4.740104239, -12.147692744), (3.722669482, -10.034967702))
            ThreePointArc((3.722669482, -10.034967702), (4.18975461, -8.700115095), (5.524607217, -9.167200224))
            Line((5.524607217, -9.167200224), (6.542041974, -11.279925266))
        make_face()
        with BuildLine():
            Line((1, -13.00134713), (-1, -13.00134713))
            Line((-1, -13.00134713), (-1, -10.656399244))
            ThreePointArc((-1, -10.656399244), (0, -9.656399244), (1, -10.656399244))
            Line((1, -10.656399244), (1, -13.00134713))
        make_face()
        with BuildLine():
            Line((-4.740104239, -12.147692744), (-6.542041974, -11.279925266))
            Line((-6.542041974, -11.279925266), (-5.524607217, -9.167200224))
            ThreePointArc((-5.524607217, -9.167200224), (-4.18975461, -8.700115095), (-3.722669482, -10.034967702))
            Line((-3.722669482, -10.034967702), (-4.740104239, -12.147692744))
        make_face()
        with BuildLine():
            Line((-9.541372699, -8.888038829), (-10.788352303, -7.324375864))
            Line((-10.788352303, -7.324375864), (-8.95499822, -5.862324771))
            ThreePointArc((-8.95499822, -5.862324771), (-7.549676936, -6.020666451), (-7.708018617, -7.425987736))
            Line((-7.708018617, -7.425987736), (-9.541372699, -8.888038829))
        make_face()
        with BuildLine():
            Line((-12.452855279, -3.867999818), (-12.897897147, -1.918143994))
            Line((-12.897897147, -1.918143994), (-10.611742, -1.396344))
            ThreePointArc((-10.611742, -1.396344), (-9.414293154, -2.148750978), (-10.166700132, -3.346199825))
            Line((-10.166700132, -3.346199825), (-12.452855279, -3.867999818))
        make_face()
        with BuildLine():
            Line((-12.897897147, 1.918143994), (-12.45285528, 3.867999818))
            Line((-12.45285528, 3.867999818), (-10.166700132, 3.346199825))
            ThreePointArc((-10.166700132, 3.346199825), (-9.414293154, 2.148750978), (-10.611742, 1.396344))
            Line((-10.611742, 1.396344), (-12.897897147, 1.918143994))
        make_face()
        with BuildLine():
            Line((-10.788352303, 7.324375864), (-9.541372699, 8.888038829))
            Line((-9.541372699, 8.888038829), (-7.708018617, 7.425987736))
            ThreePointArc((-7.708018617, 7.425987736), (-7.549676936, 6.020666451), (-8.95499822, 5.862324771))
            Line((-8.95499822, 5.862324771), (-10.788352303, 7.324375864))
        make_face()
        with BuildLine():
            Line((-6.542041974, 11.279925266), (-4.740104239, 12.147692744))
            Line((-4.740104239, 12.147692744), (-3.722669482, 10.034967702))
            ThreePointArc((-3.722669482, 10.034967702), (-4.18975461, 8.700115095), (-5.524607217, 9.167200224))
            Line((-5.524607217, 9.167200224), (-6.542041974, 11.279925266))
        make_face()
    extrude(amount=-CUT_EXTRUDE_1_DEPTH, mode=Mode.SUBTRACT)

    # Эскиз3 → Вырез-Вытянуть2 (cut)
    with BuildSketch(Plane.XY.offset(10)):
        Circle(SKETCH_3_R)
    extrude(amount=-CUT_EXTRUDE_2_DEPTH, mode=Mode.SUBTRACT)


solid = part.part
